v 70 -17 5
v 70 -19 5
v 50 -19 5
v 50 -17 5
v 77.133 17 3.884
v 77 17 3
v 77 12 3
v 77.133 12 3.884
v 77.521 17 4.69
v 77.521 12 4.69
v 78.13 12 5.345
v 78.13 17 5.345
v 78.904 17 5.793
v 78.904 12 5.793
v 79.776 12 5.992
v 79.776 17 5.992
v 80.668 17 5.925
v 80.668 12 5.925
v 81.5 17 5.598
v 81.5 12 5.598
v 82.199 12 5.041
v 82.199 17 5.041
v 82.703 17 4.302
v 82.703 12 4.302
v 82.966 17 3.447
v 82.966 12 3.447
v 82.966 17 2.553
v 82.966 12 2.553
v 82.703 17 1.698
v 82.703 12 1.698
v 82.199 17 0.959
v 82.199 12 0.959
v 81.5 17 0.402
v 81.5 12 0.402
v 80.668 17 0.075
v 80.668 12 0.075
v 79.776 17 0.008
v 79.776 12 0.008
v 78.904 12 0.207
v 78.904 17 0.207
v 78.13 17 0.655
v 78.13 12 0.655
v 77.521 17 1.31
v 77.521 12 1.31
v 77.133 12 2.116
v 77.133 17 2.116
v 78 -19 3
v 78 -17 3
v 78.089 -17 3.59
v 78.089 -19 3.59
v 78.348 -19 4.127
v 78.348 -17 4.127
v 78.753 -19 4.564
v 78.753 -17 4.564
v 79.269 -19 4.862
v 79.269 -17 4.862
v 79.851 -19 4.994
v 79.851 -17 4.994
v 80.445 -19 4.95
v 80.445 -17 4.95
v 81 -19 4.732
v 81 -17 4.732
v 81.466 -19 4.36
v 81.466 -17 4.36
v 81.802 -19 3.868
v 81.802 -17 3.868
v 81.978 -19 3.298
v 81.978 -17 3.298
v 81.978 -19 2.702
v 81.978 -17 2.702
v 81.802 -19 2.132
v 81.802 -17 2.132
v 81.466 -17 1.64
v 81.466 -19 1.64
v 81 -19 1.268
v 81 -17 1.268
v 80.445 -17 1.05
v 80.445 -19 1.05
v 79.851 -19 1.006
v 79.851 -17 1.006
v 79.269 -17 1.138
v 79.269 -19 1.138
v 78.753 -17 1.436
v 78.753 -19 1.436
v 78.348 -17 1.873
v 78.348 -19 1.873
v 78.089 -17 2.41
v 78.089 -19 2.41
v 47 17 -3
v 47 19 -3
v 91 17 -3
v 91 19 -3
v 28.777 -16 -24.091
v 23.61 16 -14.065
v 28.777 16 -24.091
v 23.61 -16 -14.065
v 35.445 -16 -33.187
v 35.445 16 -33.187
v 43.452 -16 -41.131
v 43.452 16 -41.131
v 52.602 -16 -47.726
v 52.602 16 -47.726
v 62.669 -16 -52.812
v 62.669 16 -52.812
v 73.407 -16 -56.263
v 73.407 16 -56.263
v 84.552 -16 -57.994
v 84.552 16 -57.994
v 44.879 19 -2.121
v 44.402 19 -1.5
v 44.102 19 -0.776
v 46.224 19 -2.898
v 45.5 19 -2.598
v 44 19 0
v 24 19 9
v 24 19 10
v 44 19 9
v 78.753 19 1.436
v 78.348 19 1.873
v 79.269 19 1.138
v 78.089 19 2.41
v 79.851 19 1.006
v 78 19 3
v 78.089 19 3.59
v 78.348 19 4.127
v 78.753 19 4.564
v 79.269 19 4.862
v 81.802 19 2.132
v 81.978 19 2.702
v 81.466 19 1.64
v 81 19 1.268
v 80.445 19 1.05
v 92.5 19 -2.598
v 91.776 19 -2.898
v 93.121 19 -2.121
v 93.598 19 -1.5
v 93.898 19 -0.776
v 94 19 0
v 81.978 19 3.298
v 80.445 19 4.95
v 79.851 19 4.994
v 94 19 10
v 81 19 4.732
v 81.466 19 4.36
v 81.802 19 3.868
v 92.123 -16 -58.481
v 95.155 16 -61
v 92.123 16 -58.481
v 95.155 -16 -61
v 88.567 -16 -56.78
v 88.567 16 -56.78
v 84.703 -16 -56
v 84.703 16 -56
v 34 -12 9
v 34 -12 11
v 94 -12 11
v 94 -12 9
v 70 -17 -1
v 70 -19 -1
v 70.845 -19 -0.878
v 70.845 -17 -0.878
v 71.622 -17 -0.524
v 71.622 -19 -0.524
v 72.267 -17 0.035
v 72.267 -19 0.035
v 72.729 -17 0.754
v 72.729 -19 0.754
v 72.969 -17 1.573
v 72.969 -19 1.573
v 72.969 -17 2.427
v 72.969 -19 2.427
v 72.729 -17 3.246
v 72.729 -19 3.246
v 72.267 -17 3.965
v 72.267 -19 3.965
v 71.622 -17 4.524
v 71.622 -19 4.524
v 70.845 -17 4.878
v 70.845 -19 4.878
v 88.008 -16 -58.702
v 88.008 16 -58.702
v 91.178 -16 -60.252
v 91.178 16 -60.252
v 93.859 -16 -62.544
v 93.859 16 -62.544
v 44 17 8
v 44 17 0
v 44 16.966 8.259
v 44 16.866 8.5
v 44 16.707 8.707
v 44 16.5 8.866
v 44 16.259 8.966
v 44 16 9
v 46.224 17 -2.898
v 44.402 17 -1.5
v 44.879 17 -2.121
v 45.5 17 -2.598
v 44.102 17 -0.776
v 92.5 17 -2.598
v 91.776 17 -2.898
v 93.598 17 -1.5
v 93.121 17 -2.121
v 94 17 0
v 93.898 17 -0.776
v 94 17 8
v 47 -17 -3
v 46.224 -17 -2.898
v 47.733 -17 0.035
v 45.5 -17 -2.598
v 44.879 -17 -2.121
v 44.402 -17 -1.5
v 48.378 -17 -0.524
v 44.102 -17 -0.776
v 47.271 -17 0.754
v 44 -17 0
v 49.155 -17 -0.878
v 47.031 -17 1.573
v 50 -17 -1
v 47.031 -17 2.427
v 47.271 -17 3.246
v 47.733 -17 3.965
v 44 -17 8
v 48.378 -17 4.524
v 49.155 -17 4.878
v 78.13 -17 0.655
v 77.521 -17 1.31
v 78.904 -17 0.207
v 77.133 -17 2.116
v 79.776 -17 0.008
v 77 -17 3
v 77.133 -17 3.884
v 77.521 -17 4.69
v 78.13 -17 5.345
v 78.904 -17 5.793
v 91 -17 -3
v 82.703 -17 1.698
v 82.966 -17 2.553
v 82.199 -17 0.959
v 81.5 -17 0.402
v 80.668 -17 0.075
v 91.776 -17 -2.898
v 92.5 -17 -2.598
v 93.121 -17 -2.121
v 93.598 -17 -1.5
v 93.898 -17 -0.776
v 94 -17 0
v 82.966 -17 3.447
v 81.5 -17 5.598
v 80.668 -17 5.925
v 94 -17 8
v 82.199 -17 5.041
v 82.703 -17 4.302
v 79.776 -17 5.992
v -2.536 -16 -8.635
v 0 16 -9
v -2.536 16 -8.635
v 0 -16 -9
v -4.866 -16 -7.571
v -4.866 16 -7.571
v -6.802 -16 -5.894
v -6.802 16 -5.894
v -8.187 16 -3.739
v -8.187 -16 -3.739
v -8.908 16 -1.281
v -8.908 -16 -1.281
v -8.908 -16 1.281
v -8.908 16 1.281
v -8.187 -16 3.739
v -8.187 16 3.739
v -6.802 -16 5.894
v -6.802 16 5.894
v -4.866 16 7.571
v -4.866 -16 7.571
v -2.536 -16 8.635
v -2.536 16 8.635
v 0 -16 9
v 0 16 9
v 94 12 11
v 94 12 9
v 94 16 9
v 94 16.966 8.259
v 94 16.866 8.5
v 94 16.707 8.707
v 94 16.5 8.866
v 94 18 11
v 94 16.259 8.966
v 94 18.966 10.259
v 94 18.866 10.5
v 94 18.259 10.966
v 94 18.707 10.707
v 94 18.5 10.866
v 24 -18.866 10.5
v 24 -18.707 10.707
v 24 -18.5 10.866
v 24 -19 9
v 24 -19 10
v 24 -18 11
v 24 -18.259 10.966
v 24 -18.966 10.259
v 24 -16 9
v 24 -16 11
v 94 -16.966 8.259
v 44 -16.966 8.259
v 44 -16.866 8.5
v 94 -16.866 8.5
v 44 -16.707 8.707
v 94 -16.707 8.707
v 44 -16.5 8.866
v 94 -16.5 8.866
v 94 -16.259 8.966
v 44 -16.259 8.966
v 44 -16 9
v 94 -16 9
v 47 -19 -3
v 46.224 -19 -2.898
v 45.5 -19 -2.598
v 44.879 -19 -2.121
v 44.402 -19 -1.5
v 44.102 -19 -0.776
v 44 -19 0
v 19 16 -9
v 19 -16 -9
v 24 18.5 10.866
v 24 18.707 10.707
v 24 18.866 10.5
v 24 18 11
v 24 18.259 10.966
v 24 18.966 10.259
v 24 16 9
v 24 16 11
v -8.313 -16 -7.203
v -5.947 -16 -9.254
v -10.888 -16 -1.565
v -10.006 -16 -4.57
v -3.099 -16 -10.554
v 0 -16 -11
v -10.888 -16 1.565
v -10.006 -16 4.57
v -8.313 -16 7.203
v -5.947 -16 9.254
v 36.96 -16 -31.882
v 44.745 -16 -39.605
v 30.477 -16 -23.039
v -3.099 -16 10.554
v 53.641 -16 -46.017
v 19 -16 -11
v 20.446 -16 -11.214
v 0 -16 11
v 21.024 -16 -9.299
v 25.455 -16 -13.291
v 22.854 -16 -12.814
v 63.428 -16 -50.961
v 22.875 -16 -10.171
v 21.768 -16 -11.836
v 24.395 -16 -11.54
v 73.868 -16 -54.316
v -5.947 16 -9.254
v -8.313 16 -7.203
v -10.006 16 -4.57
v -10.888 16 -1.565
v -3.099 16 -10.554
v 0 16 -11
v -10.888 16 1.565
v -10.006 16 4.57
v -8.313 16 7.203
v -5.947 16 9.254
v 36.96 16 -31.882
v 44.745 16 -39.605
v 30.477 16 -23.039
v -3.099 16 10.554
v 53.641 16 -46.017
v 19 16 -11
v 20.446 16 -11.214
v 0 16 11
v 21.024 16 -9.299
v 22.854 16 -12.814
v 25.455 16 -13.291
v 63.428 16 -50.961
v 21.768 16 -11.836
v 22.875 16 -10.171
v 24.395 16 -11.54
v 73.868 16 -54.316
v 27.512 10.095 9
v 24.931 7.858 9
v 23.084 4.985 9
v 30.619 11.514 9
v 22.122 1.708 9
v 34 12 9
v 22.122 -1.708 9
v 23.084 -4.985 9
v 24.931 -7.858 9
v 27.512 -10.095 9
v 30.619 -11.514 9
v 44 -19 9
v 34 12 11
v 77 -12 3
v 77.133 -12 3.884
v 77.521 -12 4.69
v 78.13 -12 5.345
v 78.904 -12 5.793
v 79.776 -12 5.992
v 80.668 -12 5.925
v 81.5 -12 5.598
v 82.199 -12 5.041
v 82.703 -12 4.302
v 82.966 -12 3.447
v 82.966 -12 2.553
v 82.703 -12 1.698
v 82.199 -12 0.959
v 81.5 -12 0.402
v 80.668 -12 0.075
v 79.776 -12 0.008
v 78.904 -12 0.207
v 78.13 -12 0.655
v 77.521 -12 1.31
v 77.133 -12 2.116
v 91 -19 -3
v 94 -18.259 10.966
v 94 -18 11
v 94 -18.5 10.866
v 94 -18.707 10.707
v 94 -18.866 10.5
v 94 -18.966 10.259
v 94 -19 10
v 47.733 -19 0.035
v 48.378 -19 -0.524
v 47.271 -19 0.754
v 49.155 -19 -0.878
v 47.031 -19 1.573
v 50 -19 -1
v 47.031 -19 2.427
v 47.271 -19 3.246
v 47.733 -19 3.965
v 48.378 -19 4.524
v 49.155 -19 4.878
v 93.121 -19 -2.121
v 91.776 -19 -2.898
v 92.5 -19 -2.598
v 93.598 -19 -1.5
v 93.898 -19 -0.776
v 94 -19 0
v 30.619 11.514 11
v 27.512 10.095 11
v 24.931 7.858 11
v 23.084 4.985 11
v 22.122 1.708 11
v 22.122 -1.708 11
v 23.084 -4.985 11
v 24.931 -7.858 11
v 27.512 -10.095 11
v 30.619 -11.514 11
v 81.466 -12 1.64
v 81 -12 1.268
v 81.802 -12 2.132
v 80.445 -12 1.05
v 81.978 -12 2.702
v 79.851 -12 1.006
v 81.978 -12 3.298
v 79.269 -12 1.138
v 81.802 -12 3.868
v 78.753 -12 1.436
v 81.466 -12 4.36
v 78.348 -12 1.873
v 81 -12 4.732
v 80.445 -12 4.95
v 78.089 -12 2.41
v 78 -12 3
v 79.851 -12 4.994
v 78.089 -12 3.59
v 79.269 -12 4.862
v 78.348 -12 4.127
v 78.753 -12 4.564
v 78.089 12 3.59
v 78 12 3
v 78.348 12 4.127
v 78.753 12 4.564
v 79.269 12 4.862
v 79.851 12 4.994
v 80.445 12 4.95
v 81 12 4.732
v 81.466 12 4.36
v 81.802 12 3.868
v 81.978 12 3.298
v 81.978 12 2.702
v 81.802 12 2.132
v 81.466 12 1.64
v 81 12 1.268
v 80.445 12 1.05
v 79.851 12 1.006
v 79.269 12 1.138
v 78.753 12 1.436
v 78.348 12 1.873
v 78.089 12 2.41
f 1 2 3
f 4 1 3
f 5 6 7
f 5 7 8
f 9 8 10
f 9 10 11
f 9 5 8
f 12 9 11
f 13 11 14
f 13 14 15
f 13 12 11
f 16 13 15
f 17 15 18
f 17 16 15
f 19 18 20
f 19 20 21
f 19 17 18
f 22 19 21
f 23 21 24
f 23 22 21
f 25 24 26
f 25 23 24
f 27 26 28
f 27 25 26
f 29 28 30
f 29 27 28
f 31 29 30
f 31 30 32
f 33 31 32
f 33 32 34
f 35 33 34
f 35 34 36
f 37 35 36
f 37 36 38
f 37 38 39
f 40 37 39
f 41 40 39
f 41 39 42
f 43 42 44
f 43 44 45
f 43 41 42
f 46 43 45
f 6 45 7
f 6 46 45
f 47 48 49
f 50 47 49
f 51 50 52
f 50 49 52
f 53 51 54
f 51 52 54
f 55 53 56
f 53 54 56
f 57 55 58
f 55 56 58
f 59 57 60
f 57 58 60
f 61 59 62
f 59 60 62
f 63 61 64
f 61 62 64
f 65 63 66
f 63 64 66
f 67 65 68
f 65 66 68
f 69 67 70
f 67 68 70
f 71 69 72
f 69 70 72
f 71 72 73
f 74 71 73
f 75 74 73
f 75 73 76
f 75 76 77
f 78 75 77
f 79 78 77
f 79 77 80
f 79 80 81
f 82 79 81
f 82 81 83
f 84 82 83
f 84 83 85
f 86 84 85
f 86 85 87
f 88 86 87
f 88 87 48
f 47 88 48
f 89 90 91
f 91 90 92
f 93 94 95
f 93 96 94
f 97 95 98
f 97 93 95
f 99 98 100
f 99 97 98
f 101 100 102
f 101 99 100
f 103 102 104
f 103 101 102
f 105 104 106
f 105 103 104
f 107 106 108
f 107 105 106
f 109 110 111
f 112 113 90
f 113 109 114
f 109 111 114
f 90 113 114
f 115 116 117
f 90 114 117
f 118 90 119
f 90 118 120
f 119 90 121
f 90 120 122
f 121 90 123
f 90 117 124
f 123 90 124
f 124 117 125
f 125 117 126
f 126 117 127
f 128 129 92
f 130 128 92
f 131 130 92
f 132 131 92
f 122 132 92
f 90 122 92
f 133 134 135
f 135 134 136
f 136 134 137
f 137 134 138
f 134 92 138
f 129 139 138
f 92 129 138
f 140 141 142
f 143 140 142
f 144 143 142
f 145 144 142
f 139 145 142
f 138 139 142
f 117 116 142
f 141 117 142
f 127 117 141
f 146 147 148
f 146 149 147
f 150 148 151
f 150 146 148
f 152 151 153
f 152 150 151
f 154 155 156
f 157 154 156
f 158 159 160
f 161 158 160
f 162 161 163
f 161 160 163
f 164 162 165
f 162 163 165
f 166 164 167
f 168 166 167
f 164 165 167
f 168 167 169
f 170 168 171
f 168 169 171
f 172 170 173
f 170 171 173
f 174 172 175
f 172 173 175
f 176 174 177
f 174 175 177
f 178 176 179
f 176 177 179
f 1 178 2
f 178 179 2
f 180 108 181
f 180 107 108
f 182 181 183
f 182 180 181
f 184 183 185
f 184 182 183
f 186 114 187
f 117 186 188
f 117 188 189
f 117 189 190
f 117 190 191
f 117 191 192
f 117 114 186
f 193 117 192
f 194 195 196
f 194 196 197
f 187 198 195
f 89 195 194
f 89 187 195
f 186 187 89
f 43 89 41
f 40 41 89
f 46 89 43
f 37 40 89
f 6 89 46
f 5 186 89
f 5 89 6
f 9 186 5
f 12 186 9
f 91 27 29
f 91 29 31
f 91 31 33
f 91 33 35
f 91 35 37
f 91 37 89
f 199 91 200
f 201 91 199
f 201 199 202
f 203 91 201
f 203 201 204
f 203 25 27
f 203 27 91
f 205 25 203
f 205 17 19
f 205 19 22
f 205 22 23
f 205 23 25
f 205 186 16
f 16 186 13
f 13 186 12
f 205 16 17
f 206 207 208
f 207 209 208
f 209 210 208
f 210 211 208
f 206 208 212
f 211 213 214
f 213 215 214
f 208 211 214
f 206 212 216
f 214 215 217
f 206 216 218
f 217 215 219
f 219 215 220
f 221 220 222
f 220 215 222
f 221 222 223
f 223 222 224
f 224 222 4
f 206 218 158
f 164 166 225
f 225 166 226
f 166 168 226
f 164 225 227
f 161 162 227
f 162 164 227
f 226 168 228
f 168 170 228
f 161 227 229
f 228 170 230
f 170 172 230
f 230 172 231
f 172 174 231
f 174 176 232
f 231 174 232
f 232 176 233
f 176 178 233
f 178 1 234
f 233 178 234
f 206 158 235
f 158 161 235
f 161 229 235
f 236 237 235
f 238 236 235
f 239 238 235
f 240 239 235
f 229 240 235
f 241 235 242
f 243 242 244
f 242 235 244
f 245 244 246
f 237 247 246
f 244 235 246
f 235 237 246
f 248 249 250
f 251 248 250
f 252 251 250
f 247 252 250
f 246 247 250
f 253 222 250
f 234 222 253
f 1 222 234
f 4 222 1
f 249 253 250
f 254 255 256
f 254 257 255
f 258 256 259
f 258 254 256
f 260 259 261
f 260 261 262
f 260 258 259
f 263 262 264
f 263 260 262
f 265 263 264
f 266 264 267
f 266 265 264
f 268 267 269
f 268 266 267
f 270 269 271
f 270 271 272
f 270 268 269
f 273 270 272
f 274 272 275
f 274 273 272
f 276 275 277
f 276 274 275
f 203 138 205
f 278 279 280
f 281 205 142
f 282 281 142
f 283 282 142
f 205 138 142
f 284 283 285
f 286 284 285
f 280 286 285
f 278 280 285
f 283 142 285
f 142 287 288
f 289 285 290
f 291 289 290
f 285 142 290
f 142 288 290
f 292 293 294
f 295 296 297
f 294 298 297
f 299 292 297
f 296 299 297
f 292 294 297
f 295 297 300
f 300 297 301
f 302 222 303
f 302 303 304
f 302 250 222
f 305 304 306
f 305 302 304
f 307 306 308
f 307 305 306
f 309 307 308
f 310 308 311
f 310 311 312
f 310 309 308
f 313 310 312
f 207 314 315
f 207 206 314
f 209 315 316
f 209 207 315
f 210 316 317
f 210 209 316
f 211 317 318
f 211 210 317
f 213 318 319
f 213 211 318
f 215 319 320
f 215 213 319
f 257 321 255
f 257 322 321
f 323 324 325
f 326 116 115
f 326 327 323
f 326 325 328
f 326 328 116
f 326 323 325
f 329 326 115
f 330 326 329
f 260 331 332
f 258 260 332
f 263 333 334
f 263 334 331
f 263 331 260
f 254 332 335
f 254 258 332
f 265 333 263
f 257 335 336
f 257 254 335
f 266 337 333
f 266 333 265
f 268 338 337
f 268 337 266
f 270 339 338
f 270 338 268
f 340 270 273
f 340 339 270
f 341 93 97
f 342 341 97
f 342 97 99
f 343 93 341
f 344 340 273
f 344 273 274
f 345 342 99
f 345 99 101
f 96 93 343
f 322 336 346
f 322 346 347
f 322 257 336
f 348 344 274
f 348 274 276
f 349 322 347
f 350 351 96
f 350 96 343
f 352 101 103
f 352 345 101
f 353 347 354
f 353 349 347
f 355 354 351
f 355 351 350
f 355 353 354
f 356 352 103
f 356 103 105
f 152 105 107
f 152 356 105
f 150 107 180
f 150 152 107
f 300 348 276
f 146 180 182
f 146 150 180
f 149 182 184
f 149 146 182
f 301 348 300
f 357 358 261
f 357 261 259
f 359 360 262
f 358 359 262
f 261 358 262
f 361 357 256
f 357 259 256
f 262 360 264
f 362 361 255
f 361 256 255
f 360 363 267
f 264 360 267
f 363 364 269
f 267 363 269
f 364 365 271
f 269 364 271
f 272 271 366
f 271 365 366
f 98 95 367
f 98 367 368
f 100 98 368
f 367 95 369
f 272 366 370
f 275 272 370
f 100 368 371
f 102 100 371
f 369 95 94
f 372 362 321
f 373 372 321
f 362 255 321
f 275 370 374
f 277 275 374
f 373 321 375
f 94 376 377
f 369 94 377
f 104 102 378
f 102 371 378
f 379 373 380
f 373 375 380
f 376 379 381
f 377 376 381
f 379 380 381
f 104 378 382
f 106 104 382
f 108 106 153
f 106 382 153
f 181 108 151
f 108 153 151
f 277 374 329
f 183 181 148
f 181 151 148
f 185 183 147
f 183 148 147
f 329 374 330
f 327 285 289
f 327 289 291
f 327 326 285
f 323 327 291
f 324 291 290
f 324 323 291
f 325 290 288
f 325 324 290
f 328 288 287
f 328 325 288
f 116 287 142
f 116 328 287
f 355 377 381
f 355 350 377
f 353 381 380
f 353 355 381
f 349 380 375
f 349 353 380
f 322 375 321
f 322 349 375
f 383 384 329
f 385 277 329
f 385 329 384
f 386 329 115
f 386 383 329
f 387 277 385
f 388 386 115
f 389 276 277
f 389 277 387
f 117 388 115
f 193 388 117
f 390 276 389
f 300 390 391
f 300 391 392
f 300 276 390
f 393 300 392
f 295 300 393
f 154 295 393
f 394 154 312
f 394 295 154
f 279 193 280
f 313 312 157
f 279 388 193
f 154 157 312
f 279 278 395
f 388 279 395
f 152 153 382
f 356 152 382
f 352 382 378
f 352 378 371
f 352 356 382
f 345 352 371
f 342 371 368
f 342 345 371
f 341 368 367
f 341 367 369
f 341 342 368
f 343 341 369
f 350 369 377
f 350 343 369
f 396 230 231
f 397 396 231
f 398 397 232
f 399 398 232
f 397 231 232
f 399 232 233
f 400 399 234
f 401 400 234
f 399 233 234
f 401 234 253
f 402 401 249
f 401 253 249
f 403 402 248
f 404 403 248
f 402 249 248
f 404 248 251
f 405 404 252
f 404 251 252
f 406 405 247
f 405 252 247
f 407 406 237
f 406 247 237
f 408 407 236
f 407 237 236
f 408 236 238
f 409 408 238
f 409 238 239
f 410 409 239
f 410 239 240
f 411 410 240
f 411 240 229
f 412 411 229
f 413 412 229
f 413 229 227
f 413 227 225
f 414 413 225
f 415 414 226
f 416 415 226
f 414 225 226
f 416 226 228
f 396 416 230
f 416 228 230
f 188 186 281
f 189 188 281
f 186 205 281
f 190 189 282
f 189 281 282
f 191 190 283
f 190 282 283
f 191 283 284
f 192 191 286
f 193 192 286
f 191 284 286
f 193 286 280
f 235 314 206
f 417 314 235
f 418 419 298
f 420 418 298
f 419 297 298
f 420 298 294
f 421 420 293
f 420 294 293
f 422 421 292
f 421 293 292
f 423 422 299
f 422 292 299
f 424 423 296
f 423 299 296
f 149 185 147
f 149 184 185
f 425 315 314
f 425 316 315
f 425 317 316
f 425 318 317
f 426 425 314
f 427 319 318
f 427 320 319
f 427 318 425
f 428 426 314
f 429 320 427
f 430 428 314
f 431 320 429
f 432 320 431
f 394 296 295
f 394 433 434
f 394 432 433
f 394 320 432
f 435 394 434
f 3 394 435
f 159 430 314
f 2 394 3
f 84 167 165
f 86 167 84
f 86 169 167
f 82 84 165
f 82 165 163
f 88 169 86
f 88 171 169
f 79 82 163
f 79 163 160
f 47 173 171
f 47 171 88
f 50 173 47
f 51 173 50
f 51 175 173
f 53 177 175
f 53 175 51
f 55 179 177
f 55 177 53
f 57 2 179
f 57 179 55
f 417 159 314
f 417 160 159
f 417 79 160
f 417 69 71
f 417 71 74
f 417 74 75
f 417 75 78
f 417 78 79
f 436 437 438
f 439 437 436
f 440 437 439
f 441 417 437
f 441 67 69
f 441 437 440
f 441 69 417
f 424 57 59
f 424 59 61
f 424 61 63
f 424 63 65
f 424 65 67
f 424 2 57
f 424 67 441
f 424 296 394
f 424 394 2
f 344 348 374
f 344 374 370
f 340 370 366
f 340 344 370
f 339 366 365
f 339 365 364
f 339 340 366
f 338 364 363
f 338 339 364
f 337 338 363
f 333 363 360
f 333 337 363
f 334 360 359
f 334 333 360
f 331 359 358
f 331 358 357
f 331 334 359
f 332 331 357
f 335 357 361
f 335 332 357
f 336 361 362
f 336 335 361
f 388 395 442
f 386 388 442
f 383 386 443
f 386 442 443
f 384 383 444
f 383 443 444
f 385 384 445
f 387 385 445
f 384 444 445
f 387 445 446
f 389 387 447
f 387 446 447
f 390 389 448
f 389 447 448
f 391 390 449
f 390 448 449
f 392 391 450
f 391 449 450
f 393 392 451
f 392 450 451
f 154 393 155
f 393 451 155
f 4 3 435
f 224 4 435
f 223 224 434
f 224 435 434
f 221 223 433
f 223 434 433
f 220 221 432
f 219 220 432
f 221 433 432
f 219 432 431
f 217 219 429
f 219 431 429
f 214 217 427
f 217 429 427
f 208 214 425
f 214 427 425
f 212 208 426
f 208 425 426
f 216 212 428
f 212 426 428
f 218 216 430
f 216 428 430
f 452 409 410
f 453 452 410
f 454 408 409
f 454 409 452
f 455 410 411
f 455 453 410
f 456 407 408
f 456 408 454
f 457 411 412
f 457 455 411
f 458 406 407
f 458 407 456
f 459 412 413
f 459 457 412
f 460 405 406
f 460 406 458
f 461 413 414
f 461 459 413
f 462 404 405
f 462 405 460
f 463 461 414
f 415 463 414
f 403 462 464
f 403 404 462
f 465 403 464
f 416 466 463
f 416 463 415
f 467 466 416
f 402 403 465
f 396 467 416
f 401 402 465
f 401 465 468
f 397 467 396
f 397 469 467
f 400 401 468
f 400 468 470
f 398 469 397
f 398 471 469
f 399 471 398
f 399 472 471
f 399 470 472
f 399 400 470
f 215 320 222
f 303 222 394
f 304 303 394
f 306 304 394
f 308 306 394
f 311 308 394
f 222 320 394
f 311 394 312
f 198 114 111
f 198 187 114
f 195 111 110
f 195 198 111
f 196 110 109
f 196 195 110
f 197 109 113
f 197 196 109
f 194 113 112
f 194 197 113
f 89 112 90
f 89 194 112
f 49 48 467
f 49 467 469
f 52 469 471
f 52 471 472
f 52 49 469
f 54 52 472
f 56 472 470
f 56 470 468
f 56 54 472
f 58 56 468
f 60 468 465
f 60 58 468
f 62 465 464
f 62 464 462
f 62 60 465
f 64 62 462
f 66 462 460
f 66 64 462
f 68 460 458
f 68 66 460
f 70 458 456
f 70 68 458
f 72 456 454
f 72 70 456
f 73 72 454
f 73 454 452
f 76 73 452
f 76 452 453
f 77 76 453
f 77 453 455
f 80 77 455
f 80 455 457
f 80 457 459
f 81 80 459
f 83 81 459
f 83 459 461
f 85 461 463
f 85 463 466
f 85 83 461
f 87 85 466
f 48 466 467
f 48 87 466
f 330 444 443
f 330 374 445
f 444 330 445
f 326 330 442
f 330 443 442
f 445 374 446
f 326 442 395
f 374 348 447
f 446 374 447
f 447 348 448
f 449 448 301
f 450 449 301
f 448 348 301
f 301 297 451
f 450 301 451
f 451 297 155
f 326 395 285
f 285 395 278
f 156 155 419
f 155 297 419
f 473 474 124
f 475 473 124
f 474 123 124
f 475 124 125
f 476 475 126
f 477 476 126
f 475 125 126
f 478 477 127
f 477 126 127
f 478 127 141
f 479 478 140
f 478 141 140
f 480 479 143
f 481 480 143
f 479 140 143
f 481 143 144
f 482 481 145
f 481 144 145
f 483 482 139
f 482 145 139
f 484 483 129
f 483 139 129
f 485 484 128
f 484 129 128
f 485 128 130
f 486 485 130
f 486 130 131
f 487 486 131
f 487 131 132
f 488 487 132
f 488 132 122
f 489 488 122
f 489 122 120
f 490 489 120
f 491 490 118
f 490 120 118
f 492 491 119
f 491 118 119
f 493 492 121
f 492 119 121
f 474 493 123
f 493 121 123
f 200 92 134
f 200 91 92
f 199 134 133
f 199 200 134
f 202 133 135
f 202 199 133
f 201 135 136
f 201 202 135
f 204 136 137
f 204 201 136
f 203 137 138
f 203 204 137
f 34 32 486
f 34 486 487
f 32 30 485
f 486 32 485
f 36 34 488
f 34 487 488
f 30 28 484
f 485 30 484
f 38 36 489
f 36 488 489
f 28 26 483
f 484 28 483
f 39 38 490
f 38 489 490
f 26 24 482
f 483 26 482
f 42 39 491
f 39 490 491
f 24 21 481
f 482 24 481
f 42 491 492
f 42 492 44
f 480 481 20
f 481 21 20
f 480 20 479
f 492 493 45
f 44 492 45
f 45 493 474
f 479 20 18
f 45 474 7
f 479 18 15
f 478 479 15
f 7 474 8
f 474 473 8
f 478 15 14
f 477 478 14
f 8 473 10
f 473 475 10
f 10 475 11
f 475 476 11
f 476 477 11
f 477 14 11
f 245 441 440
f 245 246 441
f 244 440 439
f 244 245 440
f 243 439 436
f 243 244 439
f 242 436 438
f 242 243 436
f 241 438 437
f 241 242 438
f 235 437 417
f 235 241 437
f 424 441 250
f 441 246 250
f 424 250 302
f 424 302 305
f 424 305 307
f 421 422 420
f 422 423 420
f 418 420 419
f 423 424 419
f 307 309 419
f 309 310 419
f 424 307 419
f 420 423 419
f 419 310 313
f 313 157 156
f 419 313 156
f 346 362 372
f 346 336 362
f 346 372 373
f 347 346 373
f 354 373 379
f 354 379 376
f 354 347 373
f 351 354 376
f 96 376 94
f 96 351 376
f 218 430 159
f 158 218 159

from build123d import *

# Parameters (mm, degrees)
F1_DEPTH  = 16
F2_W      = 70
F2_H      = 3
F3_DEPTH  = 2
F4_W      = 50
F4_H      = 14
F5_DEPTH  = 2
F6_R      = 1
F9_DEPTH  = 2
F11_DEPTH = 25
F13_D     = 4
F13_DEPTH = 50
F13_TIP   = 1.2017212381
F14_R     = 3
F14_R_2   = 2
F15_DEPTH = 5
F16_R     = 3


# Not quite as in the source:
# - a pattern or mirror of a feature is missing from the dataset's text; its kind, count and spacing are read off the source's solid


with BuildPart() as f1:
    # F0 (on Front) → F1 (new body)
    with BuildSketch(Plane.XZ):
        with BuildLine():
            Line((94, 11), (0, 11))
            ThreePointArc((0, 11), (-11, 0), (0, -11))
            Line((0, -11), (19, -11))
            ThreePointArc((19, -11), (21.7681124643, -11.8361612201), (23.6103896104, -14.064978646))
            ThreePointArc((23.6103896104, -14.064978646), (47.8977113224, -44.6078392712), (84.5520957277, -57.9942665386))
            ThreePointArc((84.5520957277, -57.9942665386), (89.6419160729, -59.3768457194), (93.8590048523, -62.5444881493))
            Line((93.8590048523, -62.5444881493), (95.1549842887, -61))
            ThreePointArc((95.1549842887, -61), (90.3976747979, -57.5207528796), (84.7034264019, -56))
            ThreePointArc((84.7034264019, -56), (49.0672193413, -42.9854179344), (25.4545454545, -13.2909701044))
            ThreePointArc((25.4545454545, -13.2909701044), (22.87535745, -10.1706257081), (19, -9))
            Line((19, -9), (0, -9))
            ThreePointArc((0, -9), (-9, 0), (0, 9))
            Line((0, 9), (94, 9))
            Line((94, 9), (94, 11))
        make_face()
    extrude(amount=F1_DEPTH)

    # F2 (on face) → F3 (join)
    with BuildSketch(Plane.XY.offset(11)):
        with Locations((59, -17.5)):
            Rectangle(F2_W, F2_H)
    extrude(amount=-F3_DEPTH)

    # F4 (on face) → F5 (join)
    with BuildSketch(Plane.XZ.offset(19)):
        with Locations((69, 4)):
            Rectangle(F4_W, F4_H)
    extrude(amount=-F5_DEPTH)

    # F6
    f6_edges = [f1.edges().sort_by_distance(p)[0] for p in [
        (59, -19, 11),
        (69, -17, 9),
    ]]
    fillet(f6_edges, radius=F6_R)

    # F7: F1 across plane


with BuildPart() as f1_1:
    add(f1.part)
    add(f1.part.mirror(Plane.XZ))

    # F8 (on face) → F9 (cut)
    with BuildSketch(Plane.XY.offset(11)):
        with BuildLine():
            Line((94, 12), (34, 12))
            ThreePointArc((34, 12), (22, 0), (34, -12))
            Line((34, -12), (94, -12))
            Line((94, -12), (94, 12))
        make_face()
    extrude(amount=-F9_DEPTH, mode=Mode.SUBTRACT)

    # F10 (on face) → F11 (cut)
    with BuildSketch(Plane.XZ.offset(19)):
        with BuildLine():
            ThreePointArc((50, 5), (47, 2), (50, -1))
            Line((50, -1), (70, -1))
            ThreePointArc((70, -1), (73, 2), (70, 5))
            Line((70, 5), (50, 5))
        make_face()
    extrude(amount=-F11_DEPTH, mode=Mode.SUBTRACT)

    # F13
    with Locations(Plane.XZ.offset(19)):
        with Locations((80, 3)):
            Hole(F13_D / 2, depth=F13_DEPTH)
            with Locations((0, 0, -(F13_DEPTH + F13_TIP / 2))):  # 118° drill point
                Cone(0, F13_D / 2, F13_TIP, mode=Mode.SUBTRACT)

    # F14 (on face) → F15 (join)
    with BuildSketch(Plane(origin=(0, -17, 0), x_dir=(-1, 0, 0), z_dir=(0, 1, 0))):
        with Locations((-80, 3)):
            Circle(F14_R)
        with Locations((-80, 3)):
            Circle(F14_R_2, mode=Mode.SUBTRACT)
    f15 = extrude(amount=F15_DEPTH)

    # F15_copies: F15 across plane
    add(f15.mirror(Plane.ZX))

    # F16
    f16_edges = [f1_1.edges().sort_by_distance(p)[0] for p in [
        (94, -18, -3),
        (94, 18, -3),
        (44, -18, -3),
        (44, 18, -3),
    ]]
    fillet(f16_edges, radius=F16_R)


solid = f1_1.part
